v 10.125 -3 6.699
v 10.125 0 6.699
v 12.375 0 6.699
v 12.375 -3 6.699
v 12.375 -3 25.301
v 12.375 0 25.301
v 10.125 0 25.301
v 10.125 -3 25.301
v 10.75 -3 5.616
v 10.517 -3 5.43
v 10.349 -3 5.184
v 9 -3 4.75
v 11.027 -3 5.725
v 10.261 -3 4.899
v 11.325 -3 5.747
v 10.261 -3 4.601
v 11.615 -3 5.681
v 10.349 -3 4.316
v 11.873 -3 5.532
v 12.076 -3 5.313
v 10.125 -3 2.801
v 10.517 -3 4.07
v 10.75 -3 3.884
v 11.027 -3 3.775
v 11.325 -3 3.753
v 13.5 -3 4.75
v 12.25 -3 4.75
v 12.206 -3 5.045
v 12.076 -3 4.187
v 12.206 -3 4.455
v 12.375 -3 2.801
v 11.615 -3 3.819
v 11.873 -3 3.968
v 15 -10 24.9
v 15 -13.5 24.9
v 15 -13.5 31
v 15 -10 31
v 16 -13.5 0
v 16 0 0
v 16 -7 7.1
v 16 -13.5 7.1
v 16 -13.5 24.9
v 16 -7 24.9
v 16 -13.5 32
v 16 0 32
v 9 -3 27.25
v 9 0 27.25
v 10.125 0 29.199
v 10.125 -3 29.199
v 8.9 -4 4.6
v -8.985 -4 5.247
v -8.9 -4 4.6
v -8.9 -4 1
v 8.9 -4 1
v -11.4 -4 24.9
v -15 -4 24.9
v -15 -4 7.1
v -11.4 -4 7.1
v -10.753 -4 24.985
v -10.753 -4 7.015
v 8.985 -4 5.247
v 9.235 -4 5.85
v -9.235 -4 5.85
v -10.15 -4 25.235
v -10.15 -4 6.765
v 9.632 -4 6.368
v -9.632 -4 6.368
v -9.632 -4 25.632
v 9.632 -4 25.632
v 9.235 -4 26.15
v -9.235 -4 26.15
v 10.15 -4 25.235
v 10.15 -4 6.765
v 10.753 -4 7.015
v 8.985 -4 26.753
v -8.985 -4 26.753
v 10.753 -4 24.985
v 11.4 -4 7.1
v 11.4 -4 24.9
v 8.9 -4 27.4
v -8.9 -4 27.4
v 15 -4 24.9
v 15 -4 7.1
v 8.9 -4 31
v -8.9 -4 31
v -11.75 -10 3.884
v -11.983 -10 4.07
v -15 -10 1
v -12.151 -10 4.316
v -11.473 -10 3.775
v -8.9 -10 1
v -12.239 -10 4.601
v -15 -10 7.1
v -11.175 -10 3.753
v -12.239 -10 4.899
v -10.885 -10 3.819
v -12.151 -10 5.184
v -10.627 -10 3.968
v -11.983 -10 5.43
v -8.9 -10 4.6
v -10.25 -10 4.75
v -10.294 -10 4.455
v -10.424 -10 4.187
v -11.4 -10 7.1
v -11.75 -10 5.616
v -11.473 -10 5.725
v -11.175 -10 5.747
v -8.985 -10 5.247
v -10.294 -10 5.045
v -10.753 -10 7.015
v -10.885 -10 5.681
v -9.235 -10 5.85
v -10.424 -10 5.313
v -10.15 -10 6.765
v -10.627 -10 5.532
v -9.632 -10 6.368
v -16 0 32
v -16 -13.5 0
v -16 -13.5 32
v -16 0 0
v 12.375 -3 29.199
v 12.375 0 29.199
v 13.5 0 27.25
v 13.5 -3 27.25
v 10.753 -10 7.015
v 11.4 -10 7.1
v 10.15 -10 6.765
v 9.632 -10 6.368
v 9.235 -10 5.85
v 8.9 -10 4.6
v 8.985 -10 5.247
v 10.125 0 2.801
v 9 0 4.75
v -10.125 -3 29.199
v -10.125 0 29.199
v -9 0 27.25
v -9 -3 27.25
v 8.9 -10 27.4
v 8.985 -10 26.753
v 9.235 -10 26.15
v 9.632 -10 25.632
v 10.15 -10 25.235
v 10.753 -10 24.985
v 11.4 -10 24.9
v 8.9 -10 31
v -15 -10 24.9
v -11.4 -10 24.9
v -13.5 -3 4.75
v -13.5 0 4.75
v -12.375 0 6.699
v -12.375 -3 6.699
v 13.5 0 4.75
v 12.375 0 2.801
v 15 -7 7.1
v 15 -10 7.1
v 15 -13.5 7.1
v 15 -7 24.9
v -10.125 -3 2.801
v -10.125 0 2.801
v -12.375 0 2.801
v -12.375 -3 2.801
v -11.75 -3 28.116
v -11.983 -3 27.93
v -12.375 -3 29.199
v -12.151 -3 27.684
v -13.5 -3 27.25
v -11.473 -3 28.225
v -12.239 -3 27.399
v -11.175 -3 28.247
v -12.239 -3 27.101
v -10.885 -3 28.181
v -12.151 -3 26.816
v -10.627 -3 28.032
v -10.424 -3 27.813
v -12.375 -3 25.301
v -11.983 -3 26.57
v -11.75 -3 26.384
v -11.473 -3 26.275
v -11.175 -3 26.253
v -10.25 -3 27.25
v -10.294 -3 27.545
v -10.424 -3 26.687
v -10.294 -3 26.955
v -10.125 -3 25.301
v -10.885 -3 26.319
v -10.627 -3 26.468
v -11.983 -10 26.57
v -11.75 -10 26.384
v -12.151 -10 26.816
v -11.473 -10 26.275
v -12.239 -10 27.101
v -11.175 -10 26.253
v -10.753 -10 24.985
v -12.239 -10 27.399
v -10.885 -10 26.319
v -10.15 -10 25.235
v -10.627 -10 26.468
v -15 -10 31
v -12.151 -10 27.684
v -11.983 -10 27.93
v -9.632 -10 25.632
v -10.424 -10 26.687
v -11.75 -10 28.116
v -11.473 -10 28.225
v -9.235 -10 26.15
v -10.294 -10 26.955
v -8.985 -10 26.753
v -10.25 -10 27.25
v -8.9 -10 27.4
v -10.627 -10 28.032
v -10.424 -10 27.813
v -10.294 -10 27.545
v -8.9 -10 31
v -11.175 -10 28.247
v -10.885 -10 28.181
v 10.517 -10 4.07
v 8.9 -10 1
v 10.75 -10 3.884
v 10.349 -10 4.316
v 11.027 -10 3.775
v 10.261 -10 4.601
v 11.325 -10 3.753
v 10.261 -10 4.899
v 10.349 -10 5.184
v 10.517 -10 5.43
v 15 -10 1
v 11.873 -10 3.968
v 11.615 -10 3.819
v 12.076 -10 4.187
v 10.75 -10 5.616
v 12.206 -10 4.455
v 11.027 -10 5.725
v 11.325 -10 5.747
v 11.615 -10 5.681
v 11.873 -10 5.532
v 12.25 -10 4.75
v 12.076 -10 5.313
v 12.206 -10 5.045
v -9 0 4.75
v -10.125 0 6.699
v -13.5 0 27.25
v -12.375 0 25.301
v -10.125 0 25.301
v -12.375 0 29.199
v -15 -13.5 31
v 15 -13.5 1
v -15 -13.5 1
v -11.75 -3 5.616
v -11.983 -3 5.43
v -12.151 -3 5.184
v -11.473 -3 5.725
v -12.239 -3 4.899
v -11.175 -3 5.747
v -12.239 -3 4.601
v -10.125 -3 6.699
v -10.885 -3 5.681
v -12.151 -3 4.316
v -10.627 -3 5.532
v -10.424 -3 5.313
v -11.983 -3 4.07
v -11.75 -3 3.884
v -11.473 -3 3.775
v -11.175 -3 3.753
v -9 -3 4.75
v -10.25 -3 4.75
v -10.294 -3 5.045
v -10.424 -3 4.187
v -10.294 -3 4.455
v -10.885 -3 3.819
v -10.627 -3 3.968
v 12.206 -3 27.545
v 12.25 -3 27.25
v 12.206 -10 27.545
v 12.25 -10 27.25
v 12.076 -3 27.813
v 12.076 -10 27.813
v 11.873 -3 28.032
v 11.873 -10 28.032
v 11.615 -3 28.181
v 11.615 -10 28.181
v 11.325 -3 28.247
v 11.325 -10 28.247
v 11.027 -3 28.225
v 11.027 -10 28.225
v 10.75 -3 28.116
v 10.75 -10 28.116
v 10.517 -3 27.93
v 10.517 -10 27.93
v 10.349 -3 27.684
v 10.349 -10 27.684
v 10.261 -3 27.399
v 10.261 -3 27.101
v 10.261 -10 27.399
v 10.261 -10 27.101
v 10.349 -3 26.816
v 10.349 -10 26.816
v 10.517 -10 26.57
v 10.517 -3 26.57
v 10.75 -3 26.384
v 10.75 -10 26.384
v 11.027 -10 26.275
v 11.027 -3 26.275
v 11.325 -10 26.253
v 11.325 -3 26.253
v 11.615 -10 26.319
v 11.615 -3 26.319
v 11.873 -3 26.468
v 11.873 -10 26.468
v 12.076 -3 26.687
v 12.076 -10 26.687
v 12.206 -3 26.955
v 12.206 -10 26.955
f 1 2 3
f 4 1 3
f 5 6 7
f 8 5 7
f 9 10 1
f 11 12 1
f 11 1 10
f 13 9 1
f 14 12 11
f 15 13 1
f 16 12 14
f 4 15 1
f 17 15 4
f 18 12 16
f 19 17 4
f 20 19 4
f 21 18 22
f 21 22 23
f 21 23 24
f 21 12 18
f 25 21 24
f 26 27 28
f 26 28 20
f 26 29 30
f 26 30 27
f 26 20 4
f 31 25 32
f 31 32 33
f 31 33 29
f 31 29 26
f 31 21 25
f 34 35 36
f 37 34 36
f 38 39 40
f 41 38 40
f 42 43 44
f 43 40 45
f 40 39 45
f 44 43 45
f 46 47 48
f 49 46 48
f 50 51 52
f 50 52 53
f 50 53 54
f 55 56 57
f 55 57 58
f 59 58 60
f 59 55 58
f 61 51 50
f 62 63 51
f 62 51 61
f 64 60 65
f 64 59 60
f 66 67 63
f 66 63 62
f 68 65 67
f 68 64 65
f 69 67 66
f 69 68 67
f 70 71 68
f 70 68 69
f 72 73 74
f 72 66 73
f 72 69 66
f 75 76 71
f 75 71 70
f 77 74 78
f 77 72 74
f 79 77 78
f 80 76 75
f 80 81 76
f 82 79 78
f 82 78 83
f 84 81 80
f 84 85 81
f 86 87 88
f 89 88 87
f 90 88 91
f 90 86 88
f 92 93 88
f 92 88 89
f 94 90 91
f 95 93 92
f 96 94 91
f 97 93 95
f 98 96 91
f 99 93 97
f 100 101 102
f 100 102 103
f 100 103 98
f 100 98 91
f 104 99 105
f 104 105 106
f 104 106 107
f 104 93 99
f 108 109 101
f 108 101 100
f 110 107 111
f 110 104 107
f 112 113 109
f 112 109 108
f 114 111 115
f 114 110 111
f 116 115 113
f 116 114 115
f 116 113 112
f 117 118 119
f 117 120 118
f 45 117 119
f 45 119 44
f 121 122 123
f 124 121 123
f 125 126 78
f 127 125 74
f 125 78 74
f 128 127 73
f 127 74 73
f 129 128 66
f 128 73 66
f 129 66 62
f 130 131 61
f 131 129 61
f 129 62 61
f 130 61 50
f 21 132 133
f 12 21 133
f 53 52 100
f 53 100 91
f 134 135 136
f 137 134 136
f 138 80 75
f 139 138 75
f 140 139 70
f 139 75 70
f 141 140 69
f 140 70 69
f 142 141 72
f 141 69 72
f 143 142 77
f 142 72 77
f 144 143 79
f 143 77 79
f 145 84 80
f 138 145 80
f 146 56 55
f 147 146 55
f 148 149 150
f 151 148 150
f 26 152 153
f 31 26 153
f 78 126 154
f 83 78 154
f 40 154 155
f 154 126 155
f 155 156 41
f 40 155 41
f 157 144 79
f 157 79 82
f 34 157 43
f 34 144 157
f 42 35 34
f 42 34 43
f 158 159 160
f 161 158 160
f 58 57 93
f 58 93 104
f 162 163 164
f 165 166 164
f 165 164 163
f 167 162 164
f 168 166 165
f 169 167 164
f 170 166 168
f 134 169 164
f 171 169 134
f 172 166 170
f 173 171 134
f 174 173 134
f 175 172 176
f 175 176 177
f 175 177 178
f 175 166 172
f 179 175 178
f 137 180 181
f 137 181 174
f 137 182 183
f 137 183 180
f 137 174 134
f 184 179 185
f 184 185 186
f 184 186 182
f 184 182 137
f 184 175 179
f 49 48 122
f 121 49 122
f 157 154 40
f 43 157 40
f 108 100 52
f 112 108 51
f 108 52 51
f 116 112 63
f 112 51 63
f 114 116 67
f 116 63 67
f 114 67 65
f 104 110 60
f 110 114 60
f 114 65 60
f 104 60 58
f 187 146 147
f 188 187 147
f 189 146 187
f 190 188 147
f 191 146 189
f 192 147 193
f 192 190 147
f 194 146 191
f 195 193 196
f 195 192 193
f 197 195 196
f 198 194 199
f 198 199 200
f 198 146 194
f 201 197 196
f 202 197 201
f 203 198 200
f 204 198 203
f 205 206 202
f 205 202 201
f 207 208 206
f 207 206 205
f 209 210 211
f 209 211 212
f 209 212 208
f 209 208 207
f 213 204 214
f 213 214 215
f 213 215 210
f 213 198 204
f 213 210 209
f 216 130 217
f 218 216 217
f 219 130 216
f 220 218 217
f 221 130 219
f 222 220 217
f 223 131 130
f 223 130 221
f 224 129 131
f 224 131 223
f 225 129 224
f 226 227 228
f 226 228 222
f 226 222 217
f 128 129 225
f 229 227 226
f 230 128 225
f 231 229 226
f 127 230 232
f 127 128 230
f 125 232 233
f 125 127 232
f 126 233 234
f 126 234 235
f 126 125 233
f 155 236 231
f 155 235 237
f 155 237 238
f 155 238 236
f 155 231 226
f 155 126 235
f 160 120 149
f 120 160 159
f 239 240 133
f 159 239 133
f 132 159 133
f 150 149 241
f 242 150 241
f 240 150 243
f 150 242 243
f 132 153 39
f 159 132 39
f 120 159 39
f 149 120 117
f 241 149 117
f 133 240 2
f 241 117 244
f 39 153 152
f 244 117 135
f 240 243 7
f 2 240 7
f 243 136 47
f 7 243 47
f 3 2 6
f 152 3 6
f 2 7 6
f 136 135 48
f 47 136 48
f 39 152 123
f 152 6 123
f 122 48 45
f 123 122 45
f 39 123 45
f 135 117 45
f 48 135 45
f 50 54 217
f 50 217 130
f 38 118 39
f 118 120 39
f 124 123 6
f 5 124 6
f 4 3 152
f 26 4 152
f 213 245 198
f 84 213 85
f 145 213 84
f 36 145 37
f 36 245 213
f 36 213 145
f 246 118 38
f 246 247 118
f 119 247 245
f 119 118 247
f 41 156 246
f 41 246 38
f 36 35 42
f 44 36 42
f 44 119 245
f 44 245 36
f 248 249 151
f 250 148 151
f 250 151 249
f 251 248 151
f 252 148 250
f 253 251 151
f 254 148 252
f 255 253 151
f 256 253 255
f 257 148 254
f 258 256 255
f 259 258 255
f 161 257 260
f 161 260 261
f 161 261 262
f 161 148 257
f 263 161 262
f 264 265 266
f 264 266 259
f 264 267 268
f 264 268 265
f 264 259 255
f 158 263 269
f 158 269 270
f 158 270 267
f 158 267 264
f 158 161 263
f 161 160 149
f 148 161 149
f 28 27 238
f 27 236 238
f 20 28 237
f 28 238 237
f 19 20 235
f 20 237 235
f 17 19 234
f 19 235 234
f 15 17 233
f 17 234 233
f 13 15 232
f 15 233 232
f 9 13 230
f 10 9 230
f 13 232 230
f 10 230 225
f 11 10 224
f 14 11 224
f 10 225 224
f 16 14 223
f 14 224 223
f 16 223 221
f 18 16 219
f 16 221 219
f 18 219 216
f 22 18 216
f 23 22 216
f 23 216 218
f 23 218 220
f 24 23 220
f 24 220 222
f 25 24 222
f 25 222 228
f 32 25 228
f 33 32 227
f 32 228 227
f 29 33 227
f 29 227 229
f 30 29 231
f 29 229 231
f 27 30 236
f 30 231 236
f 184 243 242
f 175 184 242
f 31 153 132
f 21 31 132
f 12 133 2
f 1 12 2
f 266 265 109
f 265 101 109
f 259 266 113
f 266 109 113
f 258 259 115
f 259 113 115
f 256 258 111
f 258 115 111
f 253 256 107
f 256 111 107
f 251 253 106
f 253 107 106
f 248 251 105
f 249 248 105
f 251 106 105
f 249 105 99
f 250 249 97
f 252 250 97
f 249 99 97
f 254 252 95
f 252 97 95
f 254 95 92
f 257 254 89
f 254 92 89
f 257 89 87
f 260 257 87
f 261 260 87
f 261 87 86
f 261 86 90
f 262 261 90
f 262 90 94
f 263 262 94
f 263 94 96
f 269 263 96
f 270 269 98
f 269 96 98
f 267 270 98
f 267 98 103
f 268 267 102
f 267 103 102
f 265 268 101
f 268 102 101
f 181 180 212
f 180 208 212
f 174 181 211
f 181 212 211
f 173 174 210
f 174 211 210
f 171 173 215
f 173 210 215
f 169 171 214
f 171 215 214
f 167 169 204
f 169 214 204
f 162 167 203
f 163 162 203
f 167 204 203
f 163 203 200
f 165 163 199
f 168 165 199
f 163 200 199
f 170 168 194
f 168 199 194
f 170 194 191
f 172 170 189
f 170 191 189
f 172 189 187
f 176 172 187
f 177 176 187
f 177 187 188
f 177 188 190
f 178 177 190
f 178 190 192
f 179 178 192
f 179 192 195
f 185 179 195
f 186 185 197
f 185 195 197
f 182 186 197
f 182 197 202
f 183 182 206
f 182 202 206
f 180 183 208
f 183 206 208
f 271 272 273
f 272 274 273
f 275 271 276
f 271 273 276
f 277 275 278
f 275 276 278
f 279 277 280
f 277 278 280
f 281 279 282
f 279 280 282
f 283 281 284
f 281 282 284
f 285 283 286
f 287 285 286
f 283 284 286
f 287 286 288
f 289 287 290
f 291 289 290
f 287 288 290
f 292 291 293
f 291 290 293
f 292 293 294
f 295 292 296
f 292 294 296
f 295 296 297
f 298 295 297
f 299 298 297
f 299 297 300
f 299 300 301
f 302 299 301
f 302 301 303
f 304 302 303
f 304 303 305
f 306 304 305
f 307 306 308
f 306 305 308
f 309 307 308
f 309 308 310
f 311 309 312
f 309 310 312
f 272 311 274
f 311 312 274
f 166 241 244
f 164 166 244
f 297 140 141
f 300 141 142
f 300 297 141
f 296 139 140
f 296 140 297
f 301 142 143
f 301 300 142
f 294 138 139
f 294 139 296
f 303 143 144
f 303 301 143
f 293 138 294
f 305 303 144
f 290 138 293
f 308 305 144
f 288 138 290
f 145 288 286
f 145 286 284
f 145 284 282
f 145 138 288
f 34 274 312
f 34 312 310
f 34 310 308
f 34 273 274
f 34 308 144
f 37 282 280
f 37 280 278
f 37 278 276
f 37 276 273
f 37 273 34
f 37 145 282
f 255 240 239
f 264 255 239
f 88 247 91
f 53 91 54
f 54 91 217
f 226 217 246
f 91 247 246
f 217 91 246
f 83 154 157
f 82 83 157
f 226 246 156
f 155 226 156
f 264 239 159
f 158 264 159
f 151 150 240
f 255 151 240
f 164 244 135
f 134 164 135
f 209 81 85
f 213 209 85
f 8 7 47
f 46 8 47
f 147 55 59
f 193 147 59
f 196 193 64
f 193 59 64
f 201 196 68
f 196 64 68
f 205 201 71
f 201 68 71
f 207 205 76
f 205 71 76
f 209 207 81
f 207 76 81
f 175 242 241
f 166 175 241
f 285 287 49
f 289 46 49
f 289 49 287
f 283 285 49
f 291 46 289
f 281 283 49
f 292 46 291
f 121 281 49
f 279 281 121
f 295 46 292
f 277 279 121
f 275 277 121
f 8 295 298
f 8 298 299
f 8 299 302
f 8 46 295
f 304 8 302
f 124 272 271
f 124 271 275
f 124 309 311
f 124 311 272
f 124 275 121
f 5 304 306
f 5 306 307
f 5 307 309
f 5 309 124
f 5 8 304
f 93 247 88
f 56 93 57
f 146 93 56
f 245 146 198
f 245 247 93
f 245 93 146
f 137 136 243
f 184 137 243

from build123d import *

# Parameters (mm, degrees)
SKETCH_W             = 32
SKETCH_H             = 32
PAD_DEPTH            = 4
SKETCH001_W          = 32
SKETCH001_H          = 32
SKETCH001_R          = 1
PAD001_DEPTH         = 9.5
SKETCH002_W          = 30
SKETCH002_H          = 30
POCKET_DEPTH         = 3.5
SKETCH003_W          = 1
SKETCH003_H          = 17.8
POCKET001_DEPTH      = 6.5
SKETCH004_R          = 1
POCKET002_DEPTH      = 4.001
POCKET002_DEPTH_BACK = 9.501
POCKET003_DEPTH      = 3


with BuildPart() as part:
    # Sketch → Pad (new body)
    with BuildSketch(Plane.XZ):
        with Locations((0, 16)):
            Rectangle(SKETCH_W, SKETCH_H)
    extrude(amount=PAD_DEPTH)

    # Sketch001 (on Face6 of Pad) → Pad001 (join)
    with BuildSketch(Plane.XZ.offset(4)):
        with Locations((0, 16)):
            Rectangle(SKETCH001_W, SKETCH001_H)
        with Locations((-11.25, 4.75)):
            Circle(SKETCH001_R, mode=Mode.SUBTRACT)
        with Locations((11.25, 4.75)):
            Circle(SKETCH001_R, mode=Mode.SUBTRACT)
        with Locations((11.25, 27.25)):
            Circle(SKETCH001_R, mode=Mode.SUBTRACT)
        with Locations((-11.25, 27.25)):
            Circle(SKETCH001_R, mode=Mode.SUBTRACT)
        with BuildLine():
            Line((-15, 24.9), (-11.4, 24.9))
            ThreePointArc((-11.4, 24.9), (-9.632233, 25.632233), (-8.9, 27.4))
            Line((-8.9, 27.4), (-8.9, 31))
            Line((-8.9, 31), (8.9, 31))
            Line((8.9, 31), (8.9, 27.4))
            ThreePointArc((8.9, 27.4), (9.632233, 25.632233), (11.4, 24.9))
            Line((11.4, 24.9), (15, 24.9))
            Line((15, 24.9), (15, 7.1))
            Line((11.4, 7.1), (15, 7.1))
            ThreePointArc((11.4, 7.1), (9.632233, 6.367767), (8.9, 4.6))
            Line((8.9, 1), (8.9, 4.6))
            Line((8.9, 1), (-8.9, 1))
            Line((-8.9, 4.6), (-8.9, 1))
            ThreePointArc((-8.9, 4.6), (-9.632233, 6.367767), (-11.4, 7.1))
            Line((-15, 7.1), (-11.4, 7.1))
            Line((-15, 7.1), (-15, 24.9))
        make_face(mode=Mode.SUBTRACT)
    extrude(amount=PAD001_DEPTH)

    # Sketch002 (on Face9 of Pad001) → Pocket (cut)
    with BuildSketch(Plane.XZ.offset(13.5)):
        with Locations((0, 16)):
            Rectangle(SKETCH002_W, SKETCH002_H)
    extrude(amount=-POCKET_DEPTH, mode=Mode.SUBTRACT)

    # Sketch003 (on Face9 of Pocket) → Pocket001 (cut)
    with BuildSketch(Plane.XZ.offset(13.5)):
        with Locations((15.5, 16)):
            Rectangle(SKETCH003_W, SKETCH003_H)
    extrude(amount=-POCKET001_DEPTH, mode=Mode.SUBTRACT)

    # Sketch004 (on Face35 of Pocket001) → Pocket002 (cut, two sides)
    with BuildSketch(Plane.XZ.offset(4)) as pocket002_sk:
        with Locations((-11.25, 27.25)):
            Circle(SKETCH004_R)
        with Locations((11.25, 27.25)):
            Circle(SKETCH004_R)
        with Locations((11.25, 4.75)):
            Circle(SKETCH004_R)
        with Locations((-11.25, 4.75)):
            Circle(SKETCH004_R)
    extrude(amount=-POCKET002_DEPTH, mode=Mode.SUBTRACT)
    extrude(pocket002_sk.sketch, amount=POCKET002_DEPTH_BACK, mode=Mode.SUBTRACT)

    # Sketch005 (on Face4 of Pocket002) → Pocket003 (cut)
    with BuildSketch(Plane(origin=(0, 0, 0), x_dir=(1, 0, 0), z_dir=(0, 1, 0))):
        Polygon((-10.125, -6.698557), (-9, -4.75), (-10.125, -2.801443), (-12.375, -2.801443), (-13.5, -4.75), (-12.375, -6.698557), align=None)
        Polygon((12.375, -6.698557), (13.5, -4.75), (12.375, -2.801443), (10.125, -2.801443), (9, -4.75), (10.125, -6.698557), align=None)
        Polygon((12.375, -29.198557), (13.5, -27.25), (12.375, -25.301443), (10.125, -25.301443), (9, -27.25), (10.125, -29.198557), align=None)
        Polygon((-10.125, -29.198557), (-9, -27.25), (-10.125, -25.301443), (-12.375, -25.301443), (-13.5, -27.25), (-12.375, -29.198557), align=None)
    extrude(amount=-POCKET003_DEPTH, mode=Mode.SUBTRACT)


solid = part.part
